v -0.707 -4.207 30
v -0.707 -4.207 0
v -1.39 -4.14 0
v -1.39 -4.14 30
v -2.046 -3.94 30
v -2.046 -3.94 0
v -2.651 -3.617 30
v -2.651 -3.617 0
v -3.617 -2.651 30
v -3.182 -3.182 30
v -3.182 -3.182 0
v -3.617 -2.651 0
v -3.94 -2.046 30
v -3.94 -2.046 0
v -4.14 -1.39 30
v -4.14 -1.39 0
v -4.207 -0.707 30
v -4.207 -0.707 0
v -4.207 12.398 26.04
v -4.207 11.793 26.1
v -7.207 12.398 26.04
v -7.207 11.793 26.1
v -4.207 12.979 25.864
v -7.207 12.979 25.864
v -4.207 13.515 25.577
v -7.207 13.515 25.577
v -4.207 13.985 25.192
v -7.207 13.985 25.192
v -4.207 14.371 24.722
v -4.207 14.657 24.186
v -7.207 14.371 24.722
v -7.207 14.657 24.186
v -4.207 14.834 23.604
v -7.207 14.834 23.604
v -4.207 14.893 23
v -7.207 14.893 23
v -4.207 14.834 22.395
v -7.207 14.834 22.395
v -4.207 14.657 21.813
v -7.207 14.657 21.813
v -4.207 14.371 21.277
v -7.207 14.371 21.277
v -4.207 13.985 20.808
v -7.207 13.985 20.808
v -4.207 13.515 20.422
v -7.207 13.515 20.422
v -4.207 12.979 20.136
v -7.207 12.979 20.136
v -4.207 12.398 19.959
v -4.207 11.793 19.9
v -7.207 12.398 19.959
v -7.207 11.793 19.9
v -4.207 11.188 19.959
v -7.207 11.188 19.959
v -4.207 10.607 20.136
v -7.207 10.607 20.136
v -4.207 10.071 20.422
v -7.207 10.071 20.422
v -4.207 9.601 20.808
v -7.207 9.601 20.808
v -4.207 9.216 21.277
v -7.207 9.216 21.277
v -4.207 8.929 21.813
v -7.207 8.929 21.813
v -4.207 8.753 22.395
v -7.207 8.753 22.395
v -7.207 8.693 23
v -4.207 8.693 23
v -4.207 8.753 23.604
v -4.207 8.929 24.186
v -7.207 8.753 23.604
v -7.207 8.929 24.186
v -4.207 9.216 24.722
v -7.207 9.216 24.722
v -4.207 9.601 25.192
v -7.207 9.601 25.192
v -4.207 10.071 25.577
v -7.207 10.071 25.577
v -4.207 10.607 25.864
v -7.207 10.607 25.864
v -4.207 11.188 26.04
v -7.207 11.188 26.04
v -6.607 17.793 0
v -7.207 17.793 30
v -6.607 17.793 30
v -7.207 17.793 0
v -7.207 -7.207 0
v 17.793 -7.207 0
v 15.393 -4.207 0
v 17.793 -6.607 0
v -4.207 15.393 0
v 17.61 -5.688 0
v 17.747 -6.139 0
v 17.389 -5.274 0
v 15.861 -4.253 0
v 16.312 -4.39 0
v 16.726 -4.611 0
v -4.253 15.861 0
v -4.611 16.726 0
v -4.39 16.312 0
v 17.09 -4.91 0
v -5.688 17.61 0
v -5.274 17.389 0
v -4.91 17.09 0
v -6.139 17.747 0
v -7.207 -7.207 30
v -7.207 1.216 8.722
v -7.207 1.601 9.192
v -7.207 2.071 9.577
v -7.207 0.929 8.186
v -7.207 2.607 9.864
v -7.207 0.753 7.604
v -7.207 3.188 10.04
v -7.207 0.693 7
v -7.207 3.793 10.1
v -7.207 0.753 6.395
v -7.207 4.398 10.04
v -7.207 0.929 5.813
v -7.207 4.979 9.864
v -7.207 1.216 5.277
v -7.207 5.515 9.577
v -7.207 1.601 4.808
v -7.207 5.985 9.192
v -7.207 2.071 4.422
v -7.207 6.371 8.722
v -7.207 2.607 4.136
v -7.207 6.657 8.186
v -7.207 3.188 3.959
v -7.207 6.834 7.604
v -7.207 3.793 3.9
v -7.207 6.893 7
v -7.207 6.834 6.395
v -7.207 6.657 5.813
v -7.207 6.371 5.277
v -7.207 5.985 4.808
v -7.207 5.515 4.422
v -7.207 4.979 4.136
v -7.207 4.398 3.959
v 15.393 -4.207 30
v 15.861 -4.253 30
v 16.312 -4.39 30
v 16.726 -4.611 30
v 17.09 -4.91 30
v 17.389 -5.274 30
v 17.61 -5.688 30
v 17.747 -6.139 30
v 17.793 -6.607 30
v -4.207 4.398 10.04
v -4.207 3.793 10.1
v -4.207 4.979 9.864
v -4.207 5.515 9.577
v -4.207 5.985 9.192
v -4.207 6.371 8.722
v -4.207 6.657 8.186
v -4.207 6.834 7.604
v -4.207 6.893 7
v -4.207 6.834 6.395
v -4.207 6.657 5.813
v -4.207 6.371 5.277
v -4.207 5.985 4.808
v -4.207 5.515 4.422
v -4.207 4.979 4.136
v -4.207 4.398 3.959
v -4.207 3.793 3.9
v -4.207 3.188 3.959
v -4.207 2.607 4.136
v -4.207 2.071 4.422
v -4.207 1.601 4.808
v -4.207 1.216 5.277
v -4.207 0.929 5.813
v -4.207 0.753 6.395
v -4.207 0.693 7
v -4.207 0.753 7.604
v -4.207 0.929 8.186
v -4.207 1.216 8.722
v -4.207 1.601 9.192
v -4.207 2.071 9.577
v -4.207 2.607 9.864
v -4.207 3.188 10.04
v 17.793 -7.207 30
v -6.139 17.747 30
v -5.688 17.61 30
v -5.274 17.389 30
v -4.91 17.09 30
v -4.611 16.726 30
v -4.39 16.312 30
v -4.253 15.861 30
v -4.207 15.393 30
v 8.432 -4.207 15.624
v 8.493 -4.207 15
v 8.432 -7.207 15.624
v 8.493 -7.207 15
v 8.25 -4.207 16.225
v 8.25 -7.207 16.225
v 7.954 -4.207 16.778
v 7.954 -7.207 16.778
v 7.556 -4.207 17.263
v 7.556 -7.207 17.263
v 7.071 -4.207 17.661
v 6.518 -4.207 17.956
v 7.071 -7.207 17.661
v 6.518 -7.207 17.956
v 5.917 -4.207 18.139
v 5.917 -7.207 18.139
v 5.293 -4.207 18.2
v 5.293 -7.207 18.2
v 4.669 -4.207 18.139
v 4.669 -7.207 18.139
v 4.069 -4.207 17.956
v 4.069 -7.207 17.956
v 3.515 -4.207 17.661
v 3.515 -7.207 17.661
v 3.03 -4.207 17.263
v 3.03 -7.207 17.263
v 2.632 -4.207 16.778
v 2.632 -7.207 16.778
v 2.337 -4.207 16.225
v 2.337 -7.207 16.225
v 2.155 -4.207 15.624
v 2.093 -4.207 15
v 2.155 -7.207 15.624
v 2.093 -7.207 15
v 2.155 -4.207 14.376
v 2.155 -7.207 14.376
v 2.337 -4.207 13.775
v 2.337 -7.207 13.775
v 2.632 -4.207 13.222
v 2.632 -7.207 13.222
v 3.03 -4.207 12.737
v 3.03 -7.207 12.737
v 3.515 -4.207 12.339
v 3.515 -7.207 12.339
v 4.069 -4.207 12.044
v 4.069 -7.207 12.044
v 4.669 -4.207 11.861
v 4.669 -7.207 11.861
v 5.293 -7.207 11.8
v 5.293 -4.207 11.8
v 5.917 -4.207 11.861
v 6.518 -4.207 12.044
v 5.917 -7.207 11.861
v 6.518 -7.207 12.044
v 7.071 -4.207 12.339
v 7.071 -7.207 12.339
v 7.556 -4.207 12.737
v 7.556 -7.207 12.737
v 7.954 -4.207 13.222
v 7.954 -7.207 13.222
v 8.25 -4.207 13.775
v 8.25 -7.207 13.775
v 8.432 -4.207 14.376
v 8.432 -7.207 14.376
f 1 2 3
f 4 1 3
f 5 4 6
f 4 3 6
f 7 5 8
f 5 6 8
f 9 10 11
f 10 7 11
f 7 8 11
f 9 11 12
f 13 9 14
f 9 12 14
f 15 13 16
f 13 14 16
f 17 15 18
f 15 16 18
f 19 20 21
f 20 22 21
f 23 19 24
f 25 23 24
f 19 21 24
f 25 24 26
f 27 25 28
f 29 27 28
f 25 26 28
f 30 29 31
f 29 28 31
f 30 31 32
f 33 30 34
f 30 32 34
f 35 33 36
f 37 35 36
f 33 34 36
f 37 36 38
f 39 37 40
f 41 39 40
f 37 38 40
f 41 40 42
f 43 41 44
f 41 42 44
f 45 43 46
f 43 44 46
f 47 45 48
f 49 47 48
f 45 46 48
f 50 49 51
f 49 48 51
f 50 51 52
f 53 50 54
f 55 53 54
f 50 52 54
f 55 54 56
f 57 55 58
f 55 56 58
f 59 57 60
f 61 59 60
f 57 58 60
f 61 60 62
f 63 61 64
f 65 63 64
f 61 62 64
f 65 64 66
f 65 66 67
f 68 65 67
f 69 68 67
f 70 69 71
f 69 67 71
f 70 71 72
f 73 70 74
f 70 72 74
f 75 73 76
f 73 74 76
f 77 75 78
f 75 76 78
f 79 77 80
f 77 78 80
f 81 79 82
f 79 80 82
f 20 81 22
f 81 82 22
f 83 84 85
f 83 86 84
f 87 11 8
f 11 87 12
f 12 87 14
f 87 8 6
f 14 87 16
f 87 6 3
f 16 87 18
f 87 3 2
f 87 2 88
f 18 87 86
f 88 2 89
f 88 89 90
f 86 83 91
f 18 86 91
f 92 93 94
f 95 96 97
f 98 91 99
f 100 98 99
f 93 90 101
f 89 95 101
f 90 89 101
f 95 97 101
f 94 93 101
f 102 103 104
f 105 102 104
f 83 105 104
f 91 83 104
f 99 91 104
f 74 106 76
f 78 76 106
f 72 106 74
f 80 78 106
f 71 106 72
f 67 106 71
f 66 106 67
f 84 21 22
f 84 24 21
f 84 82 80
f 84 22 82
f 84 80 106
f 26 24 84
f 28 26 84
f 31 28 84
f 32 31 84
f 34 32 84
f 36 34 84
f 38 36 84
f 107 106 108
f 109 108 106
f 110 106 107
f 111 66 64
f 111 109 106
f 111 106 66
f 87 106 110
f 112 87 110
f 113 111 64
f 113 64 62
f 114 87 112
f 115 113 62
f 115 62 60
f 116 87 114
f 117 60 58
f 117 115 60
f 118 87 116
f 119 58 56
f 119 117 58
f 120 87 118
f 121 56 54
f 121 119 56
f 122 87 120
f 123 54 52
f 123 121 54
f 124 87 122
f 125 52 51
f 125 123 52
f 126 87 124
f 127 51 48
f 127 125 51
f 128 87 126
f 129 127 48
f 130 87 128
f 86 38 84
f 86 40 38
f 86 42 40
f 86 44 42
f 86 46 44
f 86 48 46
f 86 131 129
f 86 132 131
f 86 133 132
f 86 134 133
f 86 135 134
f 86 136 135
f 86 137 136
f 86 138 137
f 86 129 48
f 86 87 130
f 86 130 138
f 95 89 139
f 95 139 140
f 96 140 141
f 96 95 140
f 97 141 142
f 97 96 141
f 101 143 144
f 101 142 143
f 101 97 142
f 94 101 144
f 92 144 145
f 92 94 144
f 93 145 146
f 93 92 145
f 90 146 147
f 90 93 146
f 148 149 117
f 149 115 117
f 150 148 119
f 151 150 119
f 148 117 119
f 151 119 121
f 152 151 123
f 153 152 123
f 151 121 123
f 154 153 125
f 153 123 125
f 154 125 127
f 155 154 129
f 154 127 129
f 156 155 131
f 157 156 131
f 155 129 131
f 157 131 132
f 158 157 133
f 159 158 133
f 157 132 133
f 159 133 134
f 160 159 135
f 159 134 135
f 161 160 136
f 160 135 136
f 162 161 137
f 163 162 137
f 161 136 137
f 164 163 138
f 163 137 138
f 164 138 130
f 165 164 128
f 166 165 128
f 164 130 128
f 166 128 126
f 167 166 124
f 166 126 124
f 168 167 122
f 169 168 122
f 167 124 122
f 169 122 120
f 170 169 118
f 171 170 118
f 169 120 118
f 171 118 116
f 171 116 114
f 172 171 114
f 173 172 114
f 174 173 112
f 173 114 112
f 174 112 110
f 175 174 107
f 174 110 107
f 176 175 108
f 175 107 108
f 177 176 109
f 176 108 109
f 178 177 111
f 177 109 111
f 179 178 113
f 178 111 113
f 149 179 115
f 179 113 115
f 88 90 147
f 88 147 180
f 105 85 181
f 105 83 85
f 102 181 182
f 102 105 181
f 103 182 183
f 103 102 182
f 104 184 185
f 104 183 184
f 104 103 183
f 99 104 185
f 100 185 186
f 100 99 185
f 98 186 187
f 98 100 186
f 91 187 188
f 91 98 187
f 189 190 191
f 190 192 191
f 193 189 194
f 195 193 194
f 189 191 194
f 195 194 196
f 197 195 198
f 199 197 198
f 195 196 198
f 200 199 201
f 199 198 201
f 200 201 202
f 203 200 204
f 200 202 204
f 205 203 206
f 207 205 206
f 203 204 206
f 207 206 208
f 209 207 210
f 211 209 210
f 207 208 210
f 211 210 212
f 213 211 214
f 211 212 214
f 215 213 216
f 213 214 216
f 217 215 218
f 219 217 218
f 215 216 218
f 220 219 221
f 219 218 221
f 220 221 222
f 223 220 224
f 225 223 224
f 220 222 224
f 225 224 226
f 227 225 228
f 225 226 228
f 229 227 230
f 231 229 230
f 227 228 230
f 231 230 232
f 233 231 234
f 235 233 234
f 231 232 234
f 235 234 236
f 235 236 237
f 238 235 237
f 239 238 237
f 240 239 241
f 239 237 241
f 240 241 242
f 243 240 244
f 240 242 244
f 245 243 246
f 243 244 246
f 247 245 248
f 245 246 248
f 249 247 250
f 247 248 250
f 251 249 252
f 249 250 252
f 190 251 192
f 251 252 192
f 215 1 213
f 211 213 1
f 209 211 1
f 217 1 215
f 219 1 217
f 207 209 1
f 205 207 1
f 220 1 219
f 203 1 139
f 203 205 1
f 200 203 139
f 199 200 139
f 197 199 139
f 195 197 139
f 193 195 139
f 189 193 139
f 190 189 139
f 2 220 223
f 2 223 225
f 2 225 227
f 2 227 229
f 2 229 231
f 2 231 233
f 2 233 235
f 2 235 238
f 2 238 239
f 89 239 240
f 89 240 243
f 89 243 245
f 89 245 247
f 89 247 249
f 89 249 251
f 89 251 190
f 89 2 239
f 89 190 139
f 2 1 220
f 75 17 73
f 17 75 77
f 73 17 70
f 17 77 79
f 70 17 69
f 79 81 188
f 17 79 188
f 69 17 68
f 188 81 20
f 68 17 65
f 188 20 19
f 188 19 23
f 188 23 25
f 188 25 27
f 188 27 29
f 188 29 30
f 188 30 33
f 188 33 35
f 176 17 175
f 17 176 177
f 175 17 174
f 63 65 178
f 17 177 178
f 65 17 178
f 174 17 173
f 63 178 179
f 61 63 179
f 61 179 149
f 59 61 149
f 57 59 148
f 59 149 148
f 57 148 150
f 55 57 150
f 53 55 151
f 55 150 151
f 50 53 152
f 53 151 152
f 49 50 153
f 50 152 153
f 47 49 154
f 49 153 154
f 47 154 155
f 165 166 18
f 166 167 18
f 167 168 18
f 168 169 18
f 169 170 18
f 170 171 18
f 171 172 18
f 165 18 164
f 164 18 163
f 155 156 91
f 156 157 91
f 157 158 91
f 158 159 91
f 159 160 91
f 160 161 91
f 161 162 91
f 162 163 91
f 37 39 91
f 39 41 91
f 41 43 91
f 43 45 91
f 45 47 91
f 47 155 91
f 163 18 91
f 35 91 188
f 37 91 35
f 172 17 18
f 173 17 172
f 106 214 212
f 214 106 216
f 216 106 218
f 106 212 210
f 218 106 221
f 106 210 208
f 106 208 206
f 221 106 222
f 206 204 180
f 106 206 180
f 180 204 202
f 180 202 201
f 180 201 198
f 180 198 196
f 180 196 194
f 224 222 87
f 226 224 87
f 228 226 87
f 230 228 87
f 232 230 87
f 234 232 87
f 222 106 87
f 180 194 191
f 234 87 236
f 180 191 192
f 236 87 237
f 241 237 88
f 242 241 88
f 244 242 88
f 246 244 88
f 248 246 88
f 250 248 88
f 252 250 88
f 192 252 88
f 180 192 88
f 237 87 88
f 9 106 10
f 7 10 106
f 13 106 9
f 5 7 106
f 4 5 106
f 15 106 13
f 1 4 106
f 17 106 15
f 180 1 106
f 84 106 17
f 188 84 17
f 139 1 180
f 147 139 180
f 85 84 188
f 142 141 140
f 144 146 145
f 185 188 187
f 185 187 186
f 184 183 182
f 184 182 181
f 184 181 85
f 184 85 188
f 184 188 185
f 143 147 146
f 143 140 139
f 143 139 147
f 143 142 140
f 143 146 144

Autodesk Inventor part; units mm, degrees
ref_plane "YZ Plane" through (0, 0, 0) normal (1, 0, 0) x (0, 1, 0)
ref_plane "Počáteční rovina" through (0, 0, 0) normal (0, 0, 1) x (1, 0, 0)
ref_plane "Koncová rovina" through (0, 0, 30) normal (0, 0, 1) x (1, 0, 0)
sketch "Náčrt2" plane through (0, 0, 0) normal (0, 0, 1) x (1, 0, 0)
  line L0 (-4.2069, -0.7069) -> (-4.2069, 15.3931)
  line L1 (-7.2069, 17.7931) -> (-6.6069, 17.7931)
  line L2 (-7.2069, -7.2069) -> (-7.2069, 17.7931)
  line L3 (-7.2069, -7.2069) -> (17.7931, -7.2069)
  line L4 (17.7931, -6.6069) -> (17.7931, -7.2069)
  line L5 (-0.7069, -4.2069) -> (15.3931, -4.2069)
  arc A0 (-4.2069, -0.7069) -> (-0.7069, -4.2069) centre (-0.7069, -0.7069) ccw
  arc A1 (-4.2069, 15.3931) -> (-6.6069, 17.7931) centre (-6.6069, 15.3931) ccw
  arc A2 (17.7931, -6.6069) -> (15.3931, -4.2069) centre (15.3931, -6.6069) ccw
  line L6 (0, 23.3895) -> (0, -12.3063) construction
  line L7 (-12.3063, 0) -> (23.3895, 0) construction
  point P0 (-4.2069, -4.2069)
  point P1 (-4.2069, 17.7931)
  point P2 (17.7931, -4.2069)
  dimension "d4" = 25
  dimension "d6" = 25
  dimension "d8" = 3
  dimension "d10" = 3
  dimension "d17" = 3.5
  dimension "d18" = 2.4
  dimension "d19" = 7.2069
  dimension "d20" = 7.2069
extrude "Těleso" add sketch "Náčrt2" along normal up to surface (30 mm away) from surface at 0
sketch "Sketch3" plane through (0, 0, 0) normal (0, 0, 1) x (1, 0, 0)
  line L0 (0, 0) -> (10, 0)
ref_plane "Work Plane10" through (0, 0, 0) normal (0, -1, 0) x (1, 0, 0)
sketch "Sketch4" plane through (0, 0, 0) normal (0, -1, 0) x (1, 0, 0)
  line L0 (-2, 0) -> (12, 0)
  line L1 (-2, 30) -> (12, 30)
  dimension "d24" = 30
sketch "Sketch5" plane through (-7.2069, 17.7931, 0) normal (-1, 0, 0) x (0, 0, 1)
  circle A0 centre (22.9996, -6) radius 3.1 projected
  circle A1 centre (6.9996, -14) radius 3.1 projected
  line L0 (0, -2.4) -> (0, -18.5) projected
  line L1 (30, -18.5) -> (0, -18.5) projected
  line L2 (30, -2.4) -> (30, -18.5) projected
  line L3 (30, -2.4) -> (0, -2.4) projected
  point P0 (0, -17.7931)
extrude "Extrusion2" cut sketch "Sketch5" against normal blind 10 contours A0 | A1
sketch "Sketch6" plane through (-7.2069, -7.2069, 0) normal (0, -1, 0) x (1, 0, 0)
  line L0 (22.6, 30) -> (25, 30) construction
  line L1 (0, 0) -> (0, 30) construction
  line L2 (25, 30) -> (0, 0) construction
  line L3 (22.6, 0) -> (25, 0) construction
  line L4 (25, 0) -> (0, 30) construction
  circle A0 centre (12.5, 15) radius 3.2
  point P0 (7.2069, 0)
  dimension "d27" = 6.4
extrude "Extrusion3" cut sketch "Sketch6" against normal blind 10
equation "\"d4\" = b"
equation "\"d6\" = b"
equation "\"d8\" = ParT"
equation "\"d10\" = ParT"
equation "\"d17\" = R"
equation "\"d18\" = R1"
equation "\"d19\" = ex"
equation "\"d20\" = d19"
equation "\"d11\" = G_L"
equation "\"b\" = 25"
equation "\"ParT\" = 3"
equation "\"R\" = 3.5"
equation "\"R1\" = 2.4"
equation "\"G_L\" = d24"
equation "\"G_OFFSET_START\" = 0"
equation "\"G_OFFSET_END\" = 0"
equation "\"ex\" = 7.206925"
properties part number "BS 4848 - 25x25x3-30" material "Steel, Mild"
